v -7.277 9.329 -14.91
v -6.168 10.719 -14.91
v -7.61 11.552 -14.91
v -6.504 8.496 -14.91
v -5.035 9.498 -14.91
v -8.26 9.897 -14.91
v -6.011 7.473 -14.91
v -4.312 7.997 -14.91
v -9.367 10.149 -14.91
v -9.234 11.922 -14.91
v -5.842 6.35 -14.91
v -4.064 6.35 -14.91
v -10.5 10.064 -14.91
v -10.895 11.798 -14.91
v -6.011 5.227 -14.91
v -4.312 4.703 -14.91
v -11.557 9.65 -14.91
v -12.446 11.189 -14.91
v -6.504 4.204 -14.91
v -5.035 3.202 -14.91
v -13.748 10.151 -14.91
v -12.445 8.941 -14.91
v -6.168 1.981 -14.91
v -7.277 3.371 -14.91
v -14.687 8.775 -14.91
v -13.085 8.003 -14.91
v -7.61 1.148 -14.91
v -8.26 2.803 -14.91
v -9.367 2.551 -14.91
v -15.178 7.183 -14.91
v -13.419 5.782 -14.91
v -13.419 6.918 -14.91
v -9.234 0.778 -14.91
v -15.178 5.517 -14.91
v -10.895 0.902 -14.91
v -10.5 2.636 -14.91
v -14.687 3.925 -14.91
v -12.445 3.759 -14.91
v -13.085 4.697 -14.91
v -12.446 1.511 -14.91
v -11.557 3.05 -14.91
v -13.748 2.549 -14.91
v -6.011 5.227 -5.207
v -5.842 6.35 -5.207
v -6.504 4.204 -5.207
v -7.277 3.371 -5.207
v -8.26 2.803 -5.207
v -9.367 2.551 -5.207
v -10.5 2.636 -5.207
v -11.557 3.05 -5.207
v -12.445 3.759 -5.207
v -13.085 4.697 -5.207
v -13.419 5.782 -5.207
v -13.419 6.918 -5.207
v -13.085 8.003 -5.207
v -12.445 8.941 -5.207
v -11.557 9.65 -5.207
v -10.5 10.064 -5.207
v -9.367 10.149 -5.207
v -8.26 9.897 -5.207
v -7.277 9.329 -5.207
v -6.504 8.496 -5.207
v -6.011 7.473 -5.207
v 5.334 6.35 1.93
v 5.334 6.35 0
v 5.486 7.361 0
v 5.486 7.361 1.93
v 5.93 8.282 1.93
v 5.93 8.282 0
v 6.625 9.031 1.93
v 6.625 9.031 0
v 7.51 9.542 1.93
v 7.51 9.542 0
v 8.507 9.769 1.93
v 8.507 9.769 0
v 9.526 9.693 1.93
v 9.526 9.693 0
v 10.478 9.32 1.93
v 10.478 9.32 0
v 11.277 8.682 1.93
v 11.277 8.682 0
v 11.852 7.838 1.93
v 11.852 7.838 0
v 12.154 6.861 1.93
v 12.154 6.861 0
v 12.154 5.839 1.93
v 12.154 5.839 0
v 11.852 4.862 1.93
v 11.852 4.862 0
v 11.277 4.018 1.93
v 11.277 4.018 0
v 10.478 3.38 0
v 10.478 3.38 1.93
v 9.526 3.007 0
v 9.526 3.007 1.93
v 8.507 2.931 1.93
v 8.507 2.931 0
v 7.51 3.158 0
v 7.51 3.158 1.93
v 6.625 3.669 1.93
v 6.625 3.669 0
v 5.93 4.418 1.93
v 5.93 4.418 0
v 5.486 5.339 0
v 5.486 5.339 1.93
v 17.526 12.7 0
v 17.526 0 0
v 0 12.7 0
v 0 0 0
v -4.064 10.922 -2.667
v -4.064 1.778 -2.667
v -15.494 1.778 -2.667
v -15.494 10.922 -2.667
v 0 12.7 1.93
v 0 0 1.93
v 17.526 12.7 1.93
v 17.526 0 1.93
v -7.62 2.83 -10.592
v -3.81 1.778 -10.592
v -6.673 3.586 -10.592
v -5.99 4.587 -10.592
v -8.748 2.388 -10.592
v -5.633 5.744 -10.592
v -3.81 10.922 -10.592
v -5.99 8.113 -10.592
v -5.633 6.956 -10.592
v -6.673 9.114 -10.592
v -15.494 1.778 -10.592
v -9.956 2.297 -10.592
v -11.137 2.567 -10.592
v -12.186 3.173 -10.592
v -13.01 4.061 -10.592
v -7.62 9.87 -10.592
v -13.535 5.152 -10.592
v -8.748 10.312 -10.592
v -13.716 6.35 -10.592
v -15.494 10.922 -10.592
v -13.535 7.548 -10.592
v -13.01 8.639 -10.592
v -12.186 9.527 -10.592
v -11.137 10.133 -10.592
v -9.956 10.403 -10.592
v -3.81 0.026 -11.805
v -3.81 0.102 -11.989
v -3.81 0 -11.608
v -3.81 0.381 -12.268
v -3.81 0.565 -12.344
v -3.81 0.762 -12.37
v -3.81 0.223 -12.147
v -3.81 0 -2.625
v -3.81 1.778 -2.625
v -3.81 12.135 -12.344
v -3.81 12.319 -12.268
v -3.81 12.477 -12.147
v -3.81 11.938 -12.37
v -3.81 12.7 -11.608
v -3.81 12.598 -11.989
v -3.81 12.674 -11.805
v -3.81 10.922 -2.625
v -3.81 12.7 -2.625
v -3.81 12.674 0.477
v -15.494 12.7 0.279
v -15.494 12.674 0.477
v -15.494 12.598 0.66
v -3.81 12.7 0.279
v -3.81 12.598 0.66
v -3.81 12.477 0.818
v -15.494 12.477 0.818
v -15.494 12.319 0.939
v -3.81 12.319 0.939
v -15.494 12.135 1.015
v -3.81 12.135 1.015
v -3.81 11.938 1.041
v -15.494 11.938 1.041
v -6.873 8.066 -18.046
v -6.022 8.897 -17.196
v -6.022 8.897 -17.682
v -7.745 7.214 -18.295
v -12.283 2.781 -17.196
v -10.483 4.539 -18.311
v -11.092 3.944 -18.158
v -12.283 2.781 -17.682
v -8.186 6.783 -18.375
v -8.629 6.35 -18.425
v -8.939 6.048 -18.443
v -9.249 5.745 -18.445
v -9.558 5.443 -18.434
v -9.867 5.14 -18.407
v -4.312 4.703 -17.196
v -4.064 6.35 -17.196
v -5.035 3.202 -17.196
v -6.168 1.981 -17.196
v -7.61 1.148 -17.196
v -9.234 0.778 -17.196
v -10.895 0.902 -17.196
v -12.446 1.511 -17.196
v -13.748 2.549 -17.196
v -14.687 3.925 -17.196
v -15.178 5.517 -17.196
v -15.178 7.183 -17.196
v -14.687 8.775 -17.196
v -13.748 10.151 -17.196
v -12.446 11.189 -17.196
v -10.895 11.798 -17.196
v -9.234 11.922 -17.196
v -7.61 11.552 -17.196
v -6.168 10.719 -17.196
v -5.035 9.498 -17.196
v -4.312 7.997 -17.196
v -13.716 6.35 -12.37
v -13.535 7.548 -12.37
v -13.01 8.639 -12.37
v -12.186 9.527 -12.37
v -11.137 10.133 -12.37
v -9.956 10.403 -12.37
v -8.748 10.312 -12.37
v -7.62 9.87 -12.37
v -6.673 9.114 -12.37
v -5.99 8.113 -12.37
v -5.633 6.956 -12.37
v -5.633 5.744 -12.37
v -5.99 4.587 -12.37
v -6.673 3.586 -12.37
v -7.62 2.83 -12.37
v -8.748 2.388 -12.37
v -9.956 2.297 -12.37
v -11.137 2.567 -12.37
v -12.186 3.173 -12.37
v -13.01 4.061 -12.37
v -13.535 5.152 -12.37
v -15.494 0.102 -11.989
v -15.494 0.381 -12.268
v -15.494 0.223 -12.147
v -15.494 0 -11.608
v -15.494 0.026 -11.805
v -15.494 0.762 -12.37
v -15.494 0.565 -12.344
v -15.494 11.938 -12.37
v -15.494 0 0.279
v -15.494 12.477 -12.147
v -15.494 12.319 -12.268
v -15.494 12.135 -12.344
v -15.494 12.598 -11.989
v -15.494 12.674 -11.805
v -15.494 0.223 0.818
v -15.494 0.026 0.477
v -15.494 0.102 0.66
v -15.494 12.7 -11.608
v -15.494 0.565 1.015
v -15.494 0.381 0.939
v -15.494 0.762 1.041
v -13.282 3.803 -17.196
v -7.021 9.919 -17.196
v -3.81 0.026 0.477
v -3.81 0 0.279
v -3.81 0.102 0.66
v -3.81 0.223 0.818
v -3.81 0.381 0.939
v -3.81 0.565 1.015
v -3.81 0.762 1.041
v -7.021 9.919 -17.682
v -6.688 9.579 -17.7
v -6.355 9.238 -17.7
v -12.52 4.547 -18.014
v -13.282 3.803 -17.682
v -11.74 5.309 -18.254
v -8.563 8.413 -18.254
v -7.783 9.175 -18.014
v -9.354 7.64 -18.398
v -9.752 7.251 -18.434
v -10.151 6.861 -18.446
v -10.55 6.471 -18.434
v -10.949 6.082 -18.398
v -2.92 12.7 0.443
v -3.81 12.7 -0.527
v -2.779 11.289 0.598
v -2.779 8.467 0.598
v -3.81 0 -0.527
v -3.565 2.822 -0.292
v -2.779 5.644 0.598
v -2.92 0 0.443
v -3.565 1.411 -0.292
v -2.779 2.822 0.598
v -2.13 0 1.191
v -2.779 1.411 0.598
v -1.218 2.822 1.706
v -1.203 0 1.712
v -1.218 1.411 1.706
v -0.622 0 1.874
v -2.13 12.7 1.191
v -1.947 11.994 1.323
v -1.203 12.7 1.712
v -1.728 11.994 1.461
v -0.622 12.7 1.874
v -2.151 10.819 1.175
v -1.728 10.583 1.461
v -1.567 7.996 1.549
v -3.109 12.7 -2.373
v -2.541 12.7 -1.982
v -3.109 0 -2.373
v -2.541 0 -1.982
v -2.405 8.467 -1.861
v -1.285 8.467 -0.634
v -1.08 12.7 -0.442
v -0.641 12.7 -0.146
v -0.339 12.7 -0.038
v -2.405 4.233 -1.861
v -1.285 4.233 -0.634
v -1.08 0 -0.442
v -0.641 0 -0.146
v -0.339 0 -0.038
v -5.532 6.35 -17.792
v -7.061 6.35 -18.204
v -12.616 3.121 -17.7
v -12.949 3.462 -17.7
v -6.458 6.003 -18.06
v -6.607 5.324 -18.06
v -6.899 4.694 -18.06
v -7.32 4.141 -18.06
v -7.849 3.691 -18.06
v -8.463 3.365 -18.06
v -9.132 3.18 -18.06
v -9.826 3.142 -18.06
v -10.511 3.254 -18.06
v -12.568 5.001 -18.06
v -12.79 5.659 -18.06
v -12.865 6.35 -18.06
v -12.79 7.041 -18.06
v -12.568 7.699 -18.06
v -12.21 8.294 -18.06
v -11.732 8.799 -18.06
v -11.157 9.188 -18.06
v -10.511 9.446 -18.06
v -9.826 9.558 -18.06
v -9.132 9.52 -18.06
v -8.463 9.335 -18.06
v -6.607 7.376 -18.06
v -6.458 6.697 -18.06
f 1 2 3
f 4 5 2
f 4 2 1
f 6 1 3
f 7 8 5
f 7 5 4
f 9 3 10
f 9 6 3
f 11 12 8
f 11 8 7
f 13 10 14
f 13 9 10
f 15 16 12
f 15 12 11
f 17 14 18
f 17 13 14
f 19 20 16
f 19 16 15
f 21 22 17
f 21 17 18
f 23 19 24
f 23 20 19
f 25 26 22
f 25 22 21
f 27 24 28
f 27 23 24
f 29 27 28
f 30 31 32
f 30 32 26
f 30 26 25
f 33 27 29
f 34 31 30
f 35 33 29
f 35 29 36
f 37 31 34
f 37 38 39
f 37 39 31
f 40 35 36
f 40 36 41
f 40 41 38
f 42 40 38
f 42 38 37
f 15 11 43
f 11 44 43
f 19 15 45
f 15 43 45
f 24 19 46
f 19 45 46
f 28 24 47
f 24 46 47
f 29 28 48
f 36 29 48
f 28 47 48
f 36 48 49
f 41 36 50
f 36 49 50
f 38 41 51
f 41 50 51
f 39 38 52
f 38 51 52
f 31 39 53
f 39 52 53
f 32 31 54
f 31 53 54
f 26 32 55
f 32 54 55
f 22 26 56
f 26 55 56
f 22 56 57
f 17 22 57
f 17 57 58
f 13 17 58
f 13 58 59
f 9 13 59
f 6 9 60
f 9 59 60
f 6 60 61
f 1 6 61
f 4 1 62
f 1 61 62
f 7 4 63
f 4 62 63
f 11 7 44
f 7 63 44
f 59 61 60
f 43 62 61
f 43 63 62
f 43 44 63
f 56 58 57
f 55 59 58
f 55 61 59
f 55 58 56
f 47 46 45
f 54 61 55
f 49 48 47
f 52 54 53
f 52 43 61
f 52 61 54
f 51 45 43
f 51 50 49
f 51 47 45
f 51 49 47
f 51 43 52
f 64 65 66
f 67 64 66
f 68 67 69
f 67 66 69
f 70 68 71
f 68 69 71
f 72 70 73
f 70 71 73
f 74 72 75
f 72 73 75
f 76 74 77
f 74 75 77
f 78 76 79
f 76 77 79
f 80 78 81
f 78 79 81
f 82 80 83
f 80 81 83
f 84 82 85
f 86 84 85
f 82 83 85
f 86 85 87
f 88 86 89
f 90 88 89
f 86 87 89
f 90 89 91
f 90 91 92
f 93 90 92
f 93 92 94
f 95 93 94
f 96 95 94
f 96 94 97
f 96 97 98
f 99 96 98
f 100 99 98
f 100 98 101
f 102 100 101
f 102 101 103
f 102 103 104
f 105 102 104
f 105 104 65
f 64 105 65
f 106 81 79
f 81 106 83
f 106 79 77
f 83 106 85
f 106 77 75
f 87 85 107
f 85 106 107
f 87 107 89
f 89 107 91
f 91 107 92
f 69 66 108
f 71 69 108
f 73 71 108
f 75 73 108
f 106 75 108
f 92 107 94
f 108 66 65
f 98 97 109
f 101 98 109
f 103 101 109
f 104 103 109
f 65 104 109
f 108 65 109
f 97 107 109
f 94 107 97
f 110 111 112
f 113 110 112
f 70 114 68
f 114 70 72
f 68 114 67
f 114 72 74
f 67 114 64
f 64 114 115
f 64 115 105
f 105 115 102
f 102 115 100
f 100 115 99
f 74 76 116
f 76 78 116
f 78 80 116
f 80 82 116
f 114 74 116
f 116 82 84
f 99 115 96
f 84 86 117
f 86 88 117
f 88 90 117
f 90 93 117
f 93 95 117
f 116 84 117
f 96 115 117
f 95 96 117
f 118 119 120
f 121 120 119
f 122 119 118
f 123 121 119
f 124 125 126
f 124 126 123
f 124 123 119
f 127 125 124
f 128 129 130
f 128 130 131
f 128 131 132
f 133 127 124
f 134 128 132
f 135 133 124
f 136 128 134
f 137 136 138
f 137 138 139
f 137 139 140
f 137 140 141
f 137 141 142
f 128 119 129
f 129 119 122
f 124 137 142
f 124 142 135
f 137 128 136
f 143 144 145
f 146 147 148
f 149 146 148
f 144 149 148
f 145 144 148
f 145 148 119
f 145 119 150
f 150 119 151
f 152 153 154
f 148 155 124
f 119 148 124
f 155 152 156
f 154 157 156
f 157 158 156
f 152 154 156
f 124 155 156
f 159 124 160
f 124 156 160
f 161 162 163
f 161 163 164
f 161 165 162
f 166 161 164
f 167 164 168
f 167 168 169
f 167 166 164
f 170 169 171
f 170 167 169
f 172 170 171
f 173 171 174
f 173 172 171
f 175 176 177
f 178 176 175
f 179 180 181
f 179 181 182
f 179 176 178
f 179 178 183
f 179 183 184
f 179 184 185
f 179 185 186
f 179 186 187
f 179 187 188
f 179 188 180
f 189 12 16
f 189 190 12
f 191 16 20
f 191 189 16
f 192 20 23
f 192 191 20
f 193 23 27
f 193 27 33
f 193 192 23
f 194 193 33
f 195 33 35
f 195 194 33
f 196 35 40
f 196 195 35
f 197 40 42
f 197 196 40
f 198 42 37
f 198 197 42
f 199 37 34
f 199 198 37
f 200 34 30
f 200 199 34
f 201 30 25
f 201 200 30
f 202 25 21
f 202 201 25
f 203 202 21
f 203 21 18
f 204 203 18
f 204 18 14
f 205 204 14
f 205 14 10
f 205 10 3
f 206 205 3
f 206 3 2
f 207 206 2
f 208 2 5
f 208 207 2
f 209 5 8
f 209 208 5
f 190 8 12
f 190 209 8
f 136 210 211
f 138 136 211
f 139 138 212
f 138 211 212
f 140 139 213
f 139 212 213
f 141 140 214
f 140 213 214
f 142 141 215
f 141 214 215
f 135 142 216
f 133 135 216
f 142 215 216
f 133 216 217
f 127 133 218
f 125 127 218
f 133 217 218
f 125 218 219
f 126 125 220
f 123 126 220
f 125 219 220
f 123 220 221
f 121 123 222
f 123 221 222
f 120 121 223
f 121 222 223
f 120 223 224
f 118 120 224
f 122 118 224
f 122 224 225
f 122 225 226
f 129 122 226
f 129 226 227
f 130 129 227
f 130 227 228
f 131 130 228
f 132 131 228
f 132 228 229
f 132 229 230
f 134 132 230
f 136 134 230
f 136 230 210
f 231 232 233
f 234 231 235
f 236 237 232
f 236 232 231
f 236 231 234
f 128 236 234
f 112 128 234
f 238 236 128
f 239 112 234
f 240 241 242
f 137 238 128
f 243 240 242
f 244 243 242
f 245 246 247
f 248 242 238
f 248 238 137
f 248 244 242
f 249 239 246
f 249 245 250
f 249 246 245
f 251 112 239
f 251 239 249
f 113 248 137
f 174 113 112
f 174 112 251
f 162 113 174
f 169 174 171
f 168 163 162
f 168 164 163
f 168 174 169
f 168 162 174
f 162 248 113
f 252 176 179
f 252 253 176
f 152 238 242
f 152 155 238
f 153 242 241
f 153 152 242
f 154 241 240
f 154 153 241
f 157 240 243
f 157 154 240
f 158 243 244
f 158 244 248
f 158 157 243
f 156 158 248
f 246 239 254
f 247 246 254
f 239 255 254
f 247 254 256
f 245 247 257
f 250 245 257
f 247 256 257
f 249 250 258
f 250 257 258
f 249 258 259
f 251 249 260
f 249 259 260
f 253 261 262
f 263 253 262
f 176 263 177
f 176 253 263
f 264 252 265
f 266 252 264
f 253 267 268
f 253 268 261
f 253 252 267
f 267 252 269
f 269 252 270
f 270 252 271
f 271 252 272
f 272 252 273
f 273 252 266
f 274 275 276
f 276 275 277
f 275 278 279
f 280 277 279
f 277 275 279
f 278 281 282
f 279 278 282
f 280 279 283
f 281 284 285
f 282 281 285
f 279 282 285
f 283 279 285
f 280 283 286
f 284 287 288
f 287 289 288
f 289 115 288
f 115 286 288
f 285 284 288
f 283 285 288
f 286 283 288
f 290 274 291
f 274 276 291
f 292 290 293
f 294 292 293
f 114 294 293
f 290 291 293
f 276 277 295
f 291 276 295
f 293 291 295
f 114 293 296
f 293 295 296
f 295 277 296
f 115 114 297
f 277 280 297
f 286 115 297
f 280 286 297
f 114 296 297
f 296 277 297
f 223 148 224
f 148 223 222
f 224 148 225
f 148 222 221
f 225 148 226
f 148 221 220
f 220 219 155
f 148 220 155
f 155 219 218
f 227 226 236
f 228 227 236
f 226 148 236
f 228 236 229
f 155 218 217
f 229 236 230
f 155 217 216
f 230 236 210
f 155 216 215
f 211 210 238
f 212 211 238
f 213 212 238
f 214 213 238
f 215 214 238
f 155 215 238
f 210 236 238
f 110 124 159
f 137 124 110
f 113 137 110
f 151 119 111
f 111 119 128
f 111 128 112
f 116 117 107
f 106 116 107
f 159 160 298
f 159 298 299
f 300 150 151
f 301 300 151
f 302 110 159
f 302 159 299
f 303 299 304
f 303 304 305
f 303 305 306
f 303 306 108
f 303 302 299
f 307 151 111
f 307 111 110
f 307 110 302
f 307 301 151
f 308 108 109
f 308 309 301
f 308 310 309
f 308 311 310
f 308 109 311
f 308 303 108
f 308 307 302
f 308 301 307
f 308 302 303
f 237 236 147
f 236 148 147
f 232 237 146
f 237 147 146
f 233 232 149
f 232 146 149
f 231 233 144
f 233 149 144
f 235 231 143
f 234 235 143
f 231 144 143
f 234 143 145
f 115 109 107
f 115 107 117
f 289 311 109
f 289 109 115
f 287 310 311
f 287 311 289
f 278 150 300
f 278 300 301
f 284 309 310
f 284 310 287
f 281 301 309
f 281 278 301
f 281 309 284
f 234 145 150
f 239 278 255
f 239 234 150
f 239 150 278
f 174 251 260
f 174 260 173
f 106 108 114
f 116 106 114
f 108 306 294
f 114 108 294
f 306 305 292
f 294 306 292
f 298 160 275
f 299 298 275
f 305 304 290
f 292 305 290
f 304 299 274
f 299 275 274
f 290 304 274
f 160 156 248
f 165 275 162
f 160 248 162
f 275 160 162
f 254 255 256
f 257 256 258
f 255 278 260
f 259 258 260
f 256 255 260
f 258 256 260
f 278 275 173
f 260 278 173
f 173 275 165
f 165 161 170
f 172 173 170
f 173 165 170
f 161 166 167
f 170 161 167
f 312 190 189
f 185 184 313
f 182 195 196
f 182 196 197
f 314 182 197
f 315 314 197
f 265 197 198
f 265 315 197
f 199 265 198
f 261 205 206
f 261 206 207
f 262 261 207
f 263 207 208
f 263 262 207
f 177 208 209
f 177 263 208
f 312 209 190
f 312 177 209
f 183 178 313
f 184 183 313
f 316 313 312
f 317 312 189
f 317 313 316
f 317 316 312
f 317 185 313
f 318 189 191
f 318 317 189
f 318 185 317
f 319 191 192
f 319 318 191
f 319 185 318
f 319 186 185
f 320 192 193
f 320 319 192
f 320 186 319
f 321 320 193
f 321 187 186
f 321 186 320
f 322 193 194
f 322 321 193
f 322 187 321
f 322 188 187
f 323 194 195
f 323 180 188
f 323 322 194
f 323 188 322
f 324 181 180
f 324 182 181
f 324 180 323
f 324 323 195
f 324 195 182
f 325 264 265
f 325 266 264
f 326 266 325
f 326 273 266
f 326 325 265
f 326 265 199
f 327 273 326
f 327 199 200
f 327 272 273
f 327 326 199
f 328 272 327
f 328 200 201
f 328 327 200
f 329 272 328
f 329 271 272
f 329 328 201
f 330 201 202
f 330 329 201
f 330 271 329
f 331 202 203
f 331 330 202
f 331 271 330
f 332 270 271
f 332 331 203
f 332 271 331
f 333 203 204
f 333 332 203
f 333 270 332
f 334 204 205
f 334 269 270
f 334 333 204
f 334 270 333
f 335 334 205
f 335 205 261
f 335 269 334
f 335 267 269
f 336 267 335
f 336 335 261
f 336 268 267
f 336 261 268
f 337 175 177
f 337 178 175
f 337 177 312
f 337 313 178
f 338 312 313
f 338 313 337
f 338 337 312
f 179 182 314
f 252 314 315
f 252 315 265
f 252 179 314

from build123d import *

# Parameters (mm, degrees)
EXTRUDE_THIN1_DEPTH = 12.7
SKETCH2_R           = 3.429
CUT_EXTRUDE1_DEPTH  = 2.54
SKETCH3_W           = 13.4112
SKETCH3_H           = 12.7
SKETCH3_W_2         = 9.8552
SKETCH3_H_2         = 9.144
BOSS_EXTRUDE1_DEPTH = 11.684
SKETCH4_R           = 4.064
CUT_EXTRUDE2_DEPTH  = 2.54
SKETCH5_W           = 3.81
SKETCH5_H           = 9.7028
CUT_EXTRUDE3_DEPTH  = 2.54
FILLET1_R           = 0.762


# Read off the part's stored shape, not the designer's step: Extrude-Thin1
with BuildPart() as part:
    # Extrude-Thin1 outline → Extrude-Thin1 (new body)
    with BuildSketch(Plane(origin=(0, 0, 0), x_dir=(1, 0, 0), z_dir=(0, 1, 0))):
        with BuildLine():
            Line((0, -1.9304), (17.526, -1.9304))
            Line((17.526, -1.9304), (17.526, 0))
            Line((17.526, 0), (0, 0))
            add(Edge.make_bspline(
                [(-4.064, 2.667), (-1.899902787, 2.408871589), (-1.602448269, 0), (0, 0)],
                knots=[0, 0, 0, 0, 1, 1, 1, 1], degree=3))
            Line((-4.064, 2.667), (-15.494, 2.667))
            Line((-15.494, 2.667), (-15.494, 0.7366))
            Line((-15.494, 0.7366), (-4.20884166, 0.7366))
            add(Edge.make_bspline(
                [(-4.20884166, 0.7366), (-4.133644752, 0.720873402), (-4.080917647, 0.701195252), (-3.96659915, 0.643669048), (-3.90467372, 0.60420831), (-3.753435107, 0.482014662), (-3.665236626, 0.399083494), (-3.463832261, 0.18557347), (-3.351169837, 0.05541551), (-3.094522195, -0.244365971), (-2.950821499, -0.414054001), (-2.606238329, -0.780981081), (-2.404944968, -0.97952681), (-1.897342594, -1.371030345), (-1.586807679, -1.564315851), (-1.033513097, -1.776746241), (-0.835509505, -1.833997779), (-0.424705159, -1.910866197), (-0.212243475, -1.9304), (0, -1.9304)],
                knots=[0, 0, 0, 0, 0.125, 0.125, 0.25, 0.25, 0.375, 0.375, 0.5, 0.5, 0.625, 0.625, 0.75, 0.75, 0.875, 0.875, 0.9375, 0.9375, 1, 1, 1, 1], degree=3))
        make_face()
    extrude(amount=EXTRUDE_THIN1_DEPTH)

    # Sketch2 → Cut-Extrude1 (cut)
    with BuildSketch(Plane(origin=(0, 0, 0), x_dir=(-1, 0, 0), z_dir=(0, 0, -1))):
        with Locations((-8.763, 6.35)):
            Circle(SKETCH2_R)
    extrude(amount=-CUT_EXTRUDE1_DEPTH, mode=Mode.SUBTRACT)

    # Sketch3 → Boss-Extrude1 (add)
    with BuildSketch(Plane.ZY.offset(15.494)):
        with Locations((-5.6642, 6.35)):
            Rectangle(SKETCH3_W, SKETCH3_H)
        with Locations((-5.6642, 6.35)):
            Rectangle(SKETCH3_W_2, SKETCH3_H_2, mode=Mode.SUBTRACT)
    extrude(amount=-BOSS_EXTRUDE1_DEPTH)

    # Sketch4 → Cut-Extrude2 (cut)
    with BuildSketch(Plane(origin=(0, 0, -12.3698), x_dir=(-1, 0, 0), z_dir=(0, 0, -1))):
        with Locations((9.652, 6.35)):
            Circle(SKETCH4_R)
    extrude(amount=-CUT_EXTRUDE2_DEPTH, mode=Mode.SUBTRACT)

    # Fillet1
    fillet1_edges = [part.edges().sort_by_distance(p)[0] for p in [
        (-9.652, 0, 1.0414),
        (-9.652, 12.7, 1.0414),
        (-9.652, 0, -12.3698),
        (-9.652, 12.7, -12.3698),
    ]]
    fillet(fillet1_edges, radius=FILLET1_R)


with BuildPart() as body_2:
    # Sketch5 → Revolve1 (revolve)
    with BuildSketch(Plane(origin=(0, 6.35, 0), x_dir=(-1, 0, 0), z_dir=(0, 1, 0)), mode=Mode.PRIVATE) as revolve1_sk:
        with BuildLine():
            Line((9.652, -18.4658), (9.652, -14.9098))
            Line((9.652, -14.9098), (13.462, -14.9098))
            Line((13.462, -14.9098), (15.24, -14.9098))
            Line((15.24, -14.9098), (15.24, -17.1958))
            ThreePointArc((15.24, -17.1958), (12.5172506, -18.144302639), (9.652, -18.4658))
        make_face()
        with Locations((11.557, -10.0584)):
            Rectangle(SKETCH5_W, SKETCH5_H)
    revolve(revolve1_sk.sketch.rotate(Axis((-9.652, 6.35, -10.803923228), (0, 0, -1)), 180), axis=Axis((-9.652, 6.35, -10.803923228), (0, 0, -1)))

    # Sketch6 → Cut-Extrude3 (cut)
    with BuildSketch(Plane.XY.offset(-17.1958)):
        Polygon((-6.022426526, 8.897003655), (-12.282712271, 2.780632525), (-13.281573474, 3.802996345), (-7.021287729, 9.919367475), align=None)
    extrude(amount=-CUT_EXTRUDE3_DEPTH, mode=Mode.SUBTRACT)


solid = Compound([part.part, body_2.part])
